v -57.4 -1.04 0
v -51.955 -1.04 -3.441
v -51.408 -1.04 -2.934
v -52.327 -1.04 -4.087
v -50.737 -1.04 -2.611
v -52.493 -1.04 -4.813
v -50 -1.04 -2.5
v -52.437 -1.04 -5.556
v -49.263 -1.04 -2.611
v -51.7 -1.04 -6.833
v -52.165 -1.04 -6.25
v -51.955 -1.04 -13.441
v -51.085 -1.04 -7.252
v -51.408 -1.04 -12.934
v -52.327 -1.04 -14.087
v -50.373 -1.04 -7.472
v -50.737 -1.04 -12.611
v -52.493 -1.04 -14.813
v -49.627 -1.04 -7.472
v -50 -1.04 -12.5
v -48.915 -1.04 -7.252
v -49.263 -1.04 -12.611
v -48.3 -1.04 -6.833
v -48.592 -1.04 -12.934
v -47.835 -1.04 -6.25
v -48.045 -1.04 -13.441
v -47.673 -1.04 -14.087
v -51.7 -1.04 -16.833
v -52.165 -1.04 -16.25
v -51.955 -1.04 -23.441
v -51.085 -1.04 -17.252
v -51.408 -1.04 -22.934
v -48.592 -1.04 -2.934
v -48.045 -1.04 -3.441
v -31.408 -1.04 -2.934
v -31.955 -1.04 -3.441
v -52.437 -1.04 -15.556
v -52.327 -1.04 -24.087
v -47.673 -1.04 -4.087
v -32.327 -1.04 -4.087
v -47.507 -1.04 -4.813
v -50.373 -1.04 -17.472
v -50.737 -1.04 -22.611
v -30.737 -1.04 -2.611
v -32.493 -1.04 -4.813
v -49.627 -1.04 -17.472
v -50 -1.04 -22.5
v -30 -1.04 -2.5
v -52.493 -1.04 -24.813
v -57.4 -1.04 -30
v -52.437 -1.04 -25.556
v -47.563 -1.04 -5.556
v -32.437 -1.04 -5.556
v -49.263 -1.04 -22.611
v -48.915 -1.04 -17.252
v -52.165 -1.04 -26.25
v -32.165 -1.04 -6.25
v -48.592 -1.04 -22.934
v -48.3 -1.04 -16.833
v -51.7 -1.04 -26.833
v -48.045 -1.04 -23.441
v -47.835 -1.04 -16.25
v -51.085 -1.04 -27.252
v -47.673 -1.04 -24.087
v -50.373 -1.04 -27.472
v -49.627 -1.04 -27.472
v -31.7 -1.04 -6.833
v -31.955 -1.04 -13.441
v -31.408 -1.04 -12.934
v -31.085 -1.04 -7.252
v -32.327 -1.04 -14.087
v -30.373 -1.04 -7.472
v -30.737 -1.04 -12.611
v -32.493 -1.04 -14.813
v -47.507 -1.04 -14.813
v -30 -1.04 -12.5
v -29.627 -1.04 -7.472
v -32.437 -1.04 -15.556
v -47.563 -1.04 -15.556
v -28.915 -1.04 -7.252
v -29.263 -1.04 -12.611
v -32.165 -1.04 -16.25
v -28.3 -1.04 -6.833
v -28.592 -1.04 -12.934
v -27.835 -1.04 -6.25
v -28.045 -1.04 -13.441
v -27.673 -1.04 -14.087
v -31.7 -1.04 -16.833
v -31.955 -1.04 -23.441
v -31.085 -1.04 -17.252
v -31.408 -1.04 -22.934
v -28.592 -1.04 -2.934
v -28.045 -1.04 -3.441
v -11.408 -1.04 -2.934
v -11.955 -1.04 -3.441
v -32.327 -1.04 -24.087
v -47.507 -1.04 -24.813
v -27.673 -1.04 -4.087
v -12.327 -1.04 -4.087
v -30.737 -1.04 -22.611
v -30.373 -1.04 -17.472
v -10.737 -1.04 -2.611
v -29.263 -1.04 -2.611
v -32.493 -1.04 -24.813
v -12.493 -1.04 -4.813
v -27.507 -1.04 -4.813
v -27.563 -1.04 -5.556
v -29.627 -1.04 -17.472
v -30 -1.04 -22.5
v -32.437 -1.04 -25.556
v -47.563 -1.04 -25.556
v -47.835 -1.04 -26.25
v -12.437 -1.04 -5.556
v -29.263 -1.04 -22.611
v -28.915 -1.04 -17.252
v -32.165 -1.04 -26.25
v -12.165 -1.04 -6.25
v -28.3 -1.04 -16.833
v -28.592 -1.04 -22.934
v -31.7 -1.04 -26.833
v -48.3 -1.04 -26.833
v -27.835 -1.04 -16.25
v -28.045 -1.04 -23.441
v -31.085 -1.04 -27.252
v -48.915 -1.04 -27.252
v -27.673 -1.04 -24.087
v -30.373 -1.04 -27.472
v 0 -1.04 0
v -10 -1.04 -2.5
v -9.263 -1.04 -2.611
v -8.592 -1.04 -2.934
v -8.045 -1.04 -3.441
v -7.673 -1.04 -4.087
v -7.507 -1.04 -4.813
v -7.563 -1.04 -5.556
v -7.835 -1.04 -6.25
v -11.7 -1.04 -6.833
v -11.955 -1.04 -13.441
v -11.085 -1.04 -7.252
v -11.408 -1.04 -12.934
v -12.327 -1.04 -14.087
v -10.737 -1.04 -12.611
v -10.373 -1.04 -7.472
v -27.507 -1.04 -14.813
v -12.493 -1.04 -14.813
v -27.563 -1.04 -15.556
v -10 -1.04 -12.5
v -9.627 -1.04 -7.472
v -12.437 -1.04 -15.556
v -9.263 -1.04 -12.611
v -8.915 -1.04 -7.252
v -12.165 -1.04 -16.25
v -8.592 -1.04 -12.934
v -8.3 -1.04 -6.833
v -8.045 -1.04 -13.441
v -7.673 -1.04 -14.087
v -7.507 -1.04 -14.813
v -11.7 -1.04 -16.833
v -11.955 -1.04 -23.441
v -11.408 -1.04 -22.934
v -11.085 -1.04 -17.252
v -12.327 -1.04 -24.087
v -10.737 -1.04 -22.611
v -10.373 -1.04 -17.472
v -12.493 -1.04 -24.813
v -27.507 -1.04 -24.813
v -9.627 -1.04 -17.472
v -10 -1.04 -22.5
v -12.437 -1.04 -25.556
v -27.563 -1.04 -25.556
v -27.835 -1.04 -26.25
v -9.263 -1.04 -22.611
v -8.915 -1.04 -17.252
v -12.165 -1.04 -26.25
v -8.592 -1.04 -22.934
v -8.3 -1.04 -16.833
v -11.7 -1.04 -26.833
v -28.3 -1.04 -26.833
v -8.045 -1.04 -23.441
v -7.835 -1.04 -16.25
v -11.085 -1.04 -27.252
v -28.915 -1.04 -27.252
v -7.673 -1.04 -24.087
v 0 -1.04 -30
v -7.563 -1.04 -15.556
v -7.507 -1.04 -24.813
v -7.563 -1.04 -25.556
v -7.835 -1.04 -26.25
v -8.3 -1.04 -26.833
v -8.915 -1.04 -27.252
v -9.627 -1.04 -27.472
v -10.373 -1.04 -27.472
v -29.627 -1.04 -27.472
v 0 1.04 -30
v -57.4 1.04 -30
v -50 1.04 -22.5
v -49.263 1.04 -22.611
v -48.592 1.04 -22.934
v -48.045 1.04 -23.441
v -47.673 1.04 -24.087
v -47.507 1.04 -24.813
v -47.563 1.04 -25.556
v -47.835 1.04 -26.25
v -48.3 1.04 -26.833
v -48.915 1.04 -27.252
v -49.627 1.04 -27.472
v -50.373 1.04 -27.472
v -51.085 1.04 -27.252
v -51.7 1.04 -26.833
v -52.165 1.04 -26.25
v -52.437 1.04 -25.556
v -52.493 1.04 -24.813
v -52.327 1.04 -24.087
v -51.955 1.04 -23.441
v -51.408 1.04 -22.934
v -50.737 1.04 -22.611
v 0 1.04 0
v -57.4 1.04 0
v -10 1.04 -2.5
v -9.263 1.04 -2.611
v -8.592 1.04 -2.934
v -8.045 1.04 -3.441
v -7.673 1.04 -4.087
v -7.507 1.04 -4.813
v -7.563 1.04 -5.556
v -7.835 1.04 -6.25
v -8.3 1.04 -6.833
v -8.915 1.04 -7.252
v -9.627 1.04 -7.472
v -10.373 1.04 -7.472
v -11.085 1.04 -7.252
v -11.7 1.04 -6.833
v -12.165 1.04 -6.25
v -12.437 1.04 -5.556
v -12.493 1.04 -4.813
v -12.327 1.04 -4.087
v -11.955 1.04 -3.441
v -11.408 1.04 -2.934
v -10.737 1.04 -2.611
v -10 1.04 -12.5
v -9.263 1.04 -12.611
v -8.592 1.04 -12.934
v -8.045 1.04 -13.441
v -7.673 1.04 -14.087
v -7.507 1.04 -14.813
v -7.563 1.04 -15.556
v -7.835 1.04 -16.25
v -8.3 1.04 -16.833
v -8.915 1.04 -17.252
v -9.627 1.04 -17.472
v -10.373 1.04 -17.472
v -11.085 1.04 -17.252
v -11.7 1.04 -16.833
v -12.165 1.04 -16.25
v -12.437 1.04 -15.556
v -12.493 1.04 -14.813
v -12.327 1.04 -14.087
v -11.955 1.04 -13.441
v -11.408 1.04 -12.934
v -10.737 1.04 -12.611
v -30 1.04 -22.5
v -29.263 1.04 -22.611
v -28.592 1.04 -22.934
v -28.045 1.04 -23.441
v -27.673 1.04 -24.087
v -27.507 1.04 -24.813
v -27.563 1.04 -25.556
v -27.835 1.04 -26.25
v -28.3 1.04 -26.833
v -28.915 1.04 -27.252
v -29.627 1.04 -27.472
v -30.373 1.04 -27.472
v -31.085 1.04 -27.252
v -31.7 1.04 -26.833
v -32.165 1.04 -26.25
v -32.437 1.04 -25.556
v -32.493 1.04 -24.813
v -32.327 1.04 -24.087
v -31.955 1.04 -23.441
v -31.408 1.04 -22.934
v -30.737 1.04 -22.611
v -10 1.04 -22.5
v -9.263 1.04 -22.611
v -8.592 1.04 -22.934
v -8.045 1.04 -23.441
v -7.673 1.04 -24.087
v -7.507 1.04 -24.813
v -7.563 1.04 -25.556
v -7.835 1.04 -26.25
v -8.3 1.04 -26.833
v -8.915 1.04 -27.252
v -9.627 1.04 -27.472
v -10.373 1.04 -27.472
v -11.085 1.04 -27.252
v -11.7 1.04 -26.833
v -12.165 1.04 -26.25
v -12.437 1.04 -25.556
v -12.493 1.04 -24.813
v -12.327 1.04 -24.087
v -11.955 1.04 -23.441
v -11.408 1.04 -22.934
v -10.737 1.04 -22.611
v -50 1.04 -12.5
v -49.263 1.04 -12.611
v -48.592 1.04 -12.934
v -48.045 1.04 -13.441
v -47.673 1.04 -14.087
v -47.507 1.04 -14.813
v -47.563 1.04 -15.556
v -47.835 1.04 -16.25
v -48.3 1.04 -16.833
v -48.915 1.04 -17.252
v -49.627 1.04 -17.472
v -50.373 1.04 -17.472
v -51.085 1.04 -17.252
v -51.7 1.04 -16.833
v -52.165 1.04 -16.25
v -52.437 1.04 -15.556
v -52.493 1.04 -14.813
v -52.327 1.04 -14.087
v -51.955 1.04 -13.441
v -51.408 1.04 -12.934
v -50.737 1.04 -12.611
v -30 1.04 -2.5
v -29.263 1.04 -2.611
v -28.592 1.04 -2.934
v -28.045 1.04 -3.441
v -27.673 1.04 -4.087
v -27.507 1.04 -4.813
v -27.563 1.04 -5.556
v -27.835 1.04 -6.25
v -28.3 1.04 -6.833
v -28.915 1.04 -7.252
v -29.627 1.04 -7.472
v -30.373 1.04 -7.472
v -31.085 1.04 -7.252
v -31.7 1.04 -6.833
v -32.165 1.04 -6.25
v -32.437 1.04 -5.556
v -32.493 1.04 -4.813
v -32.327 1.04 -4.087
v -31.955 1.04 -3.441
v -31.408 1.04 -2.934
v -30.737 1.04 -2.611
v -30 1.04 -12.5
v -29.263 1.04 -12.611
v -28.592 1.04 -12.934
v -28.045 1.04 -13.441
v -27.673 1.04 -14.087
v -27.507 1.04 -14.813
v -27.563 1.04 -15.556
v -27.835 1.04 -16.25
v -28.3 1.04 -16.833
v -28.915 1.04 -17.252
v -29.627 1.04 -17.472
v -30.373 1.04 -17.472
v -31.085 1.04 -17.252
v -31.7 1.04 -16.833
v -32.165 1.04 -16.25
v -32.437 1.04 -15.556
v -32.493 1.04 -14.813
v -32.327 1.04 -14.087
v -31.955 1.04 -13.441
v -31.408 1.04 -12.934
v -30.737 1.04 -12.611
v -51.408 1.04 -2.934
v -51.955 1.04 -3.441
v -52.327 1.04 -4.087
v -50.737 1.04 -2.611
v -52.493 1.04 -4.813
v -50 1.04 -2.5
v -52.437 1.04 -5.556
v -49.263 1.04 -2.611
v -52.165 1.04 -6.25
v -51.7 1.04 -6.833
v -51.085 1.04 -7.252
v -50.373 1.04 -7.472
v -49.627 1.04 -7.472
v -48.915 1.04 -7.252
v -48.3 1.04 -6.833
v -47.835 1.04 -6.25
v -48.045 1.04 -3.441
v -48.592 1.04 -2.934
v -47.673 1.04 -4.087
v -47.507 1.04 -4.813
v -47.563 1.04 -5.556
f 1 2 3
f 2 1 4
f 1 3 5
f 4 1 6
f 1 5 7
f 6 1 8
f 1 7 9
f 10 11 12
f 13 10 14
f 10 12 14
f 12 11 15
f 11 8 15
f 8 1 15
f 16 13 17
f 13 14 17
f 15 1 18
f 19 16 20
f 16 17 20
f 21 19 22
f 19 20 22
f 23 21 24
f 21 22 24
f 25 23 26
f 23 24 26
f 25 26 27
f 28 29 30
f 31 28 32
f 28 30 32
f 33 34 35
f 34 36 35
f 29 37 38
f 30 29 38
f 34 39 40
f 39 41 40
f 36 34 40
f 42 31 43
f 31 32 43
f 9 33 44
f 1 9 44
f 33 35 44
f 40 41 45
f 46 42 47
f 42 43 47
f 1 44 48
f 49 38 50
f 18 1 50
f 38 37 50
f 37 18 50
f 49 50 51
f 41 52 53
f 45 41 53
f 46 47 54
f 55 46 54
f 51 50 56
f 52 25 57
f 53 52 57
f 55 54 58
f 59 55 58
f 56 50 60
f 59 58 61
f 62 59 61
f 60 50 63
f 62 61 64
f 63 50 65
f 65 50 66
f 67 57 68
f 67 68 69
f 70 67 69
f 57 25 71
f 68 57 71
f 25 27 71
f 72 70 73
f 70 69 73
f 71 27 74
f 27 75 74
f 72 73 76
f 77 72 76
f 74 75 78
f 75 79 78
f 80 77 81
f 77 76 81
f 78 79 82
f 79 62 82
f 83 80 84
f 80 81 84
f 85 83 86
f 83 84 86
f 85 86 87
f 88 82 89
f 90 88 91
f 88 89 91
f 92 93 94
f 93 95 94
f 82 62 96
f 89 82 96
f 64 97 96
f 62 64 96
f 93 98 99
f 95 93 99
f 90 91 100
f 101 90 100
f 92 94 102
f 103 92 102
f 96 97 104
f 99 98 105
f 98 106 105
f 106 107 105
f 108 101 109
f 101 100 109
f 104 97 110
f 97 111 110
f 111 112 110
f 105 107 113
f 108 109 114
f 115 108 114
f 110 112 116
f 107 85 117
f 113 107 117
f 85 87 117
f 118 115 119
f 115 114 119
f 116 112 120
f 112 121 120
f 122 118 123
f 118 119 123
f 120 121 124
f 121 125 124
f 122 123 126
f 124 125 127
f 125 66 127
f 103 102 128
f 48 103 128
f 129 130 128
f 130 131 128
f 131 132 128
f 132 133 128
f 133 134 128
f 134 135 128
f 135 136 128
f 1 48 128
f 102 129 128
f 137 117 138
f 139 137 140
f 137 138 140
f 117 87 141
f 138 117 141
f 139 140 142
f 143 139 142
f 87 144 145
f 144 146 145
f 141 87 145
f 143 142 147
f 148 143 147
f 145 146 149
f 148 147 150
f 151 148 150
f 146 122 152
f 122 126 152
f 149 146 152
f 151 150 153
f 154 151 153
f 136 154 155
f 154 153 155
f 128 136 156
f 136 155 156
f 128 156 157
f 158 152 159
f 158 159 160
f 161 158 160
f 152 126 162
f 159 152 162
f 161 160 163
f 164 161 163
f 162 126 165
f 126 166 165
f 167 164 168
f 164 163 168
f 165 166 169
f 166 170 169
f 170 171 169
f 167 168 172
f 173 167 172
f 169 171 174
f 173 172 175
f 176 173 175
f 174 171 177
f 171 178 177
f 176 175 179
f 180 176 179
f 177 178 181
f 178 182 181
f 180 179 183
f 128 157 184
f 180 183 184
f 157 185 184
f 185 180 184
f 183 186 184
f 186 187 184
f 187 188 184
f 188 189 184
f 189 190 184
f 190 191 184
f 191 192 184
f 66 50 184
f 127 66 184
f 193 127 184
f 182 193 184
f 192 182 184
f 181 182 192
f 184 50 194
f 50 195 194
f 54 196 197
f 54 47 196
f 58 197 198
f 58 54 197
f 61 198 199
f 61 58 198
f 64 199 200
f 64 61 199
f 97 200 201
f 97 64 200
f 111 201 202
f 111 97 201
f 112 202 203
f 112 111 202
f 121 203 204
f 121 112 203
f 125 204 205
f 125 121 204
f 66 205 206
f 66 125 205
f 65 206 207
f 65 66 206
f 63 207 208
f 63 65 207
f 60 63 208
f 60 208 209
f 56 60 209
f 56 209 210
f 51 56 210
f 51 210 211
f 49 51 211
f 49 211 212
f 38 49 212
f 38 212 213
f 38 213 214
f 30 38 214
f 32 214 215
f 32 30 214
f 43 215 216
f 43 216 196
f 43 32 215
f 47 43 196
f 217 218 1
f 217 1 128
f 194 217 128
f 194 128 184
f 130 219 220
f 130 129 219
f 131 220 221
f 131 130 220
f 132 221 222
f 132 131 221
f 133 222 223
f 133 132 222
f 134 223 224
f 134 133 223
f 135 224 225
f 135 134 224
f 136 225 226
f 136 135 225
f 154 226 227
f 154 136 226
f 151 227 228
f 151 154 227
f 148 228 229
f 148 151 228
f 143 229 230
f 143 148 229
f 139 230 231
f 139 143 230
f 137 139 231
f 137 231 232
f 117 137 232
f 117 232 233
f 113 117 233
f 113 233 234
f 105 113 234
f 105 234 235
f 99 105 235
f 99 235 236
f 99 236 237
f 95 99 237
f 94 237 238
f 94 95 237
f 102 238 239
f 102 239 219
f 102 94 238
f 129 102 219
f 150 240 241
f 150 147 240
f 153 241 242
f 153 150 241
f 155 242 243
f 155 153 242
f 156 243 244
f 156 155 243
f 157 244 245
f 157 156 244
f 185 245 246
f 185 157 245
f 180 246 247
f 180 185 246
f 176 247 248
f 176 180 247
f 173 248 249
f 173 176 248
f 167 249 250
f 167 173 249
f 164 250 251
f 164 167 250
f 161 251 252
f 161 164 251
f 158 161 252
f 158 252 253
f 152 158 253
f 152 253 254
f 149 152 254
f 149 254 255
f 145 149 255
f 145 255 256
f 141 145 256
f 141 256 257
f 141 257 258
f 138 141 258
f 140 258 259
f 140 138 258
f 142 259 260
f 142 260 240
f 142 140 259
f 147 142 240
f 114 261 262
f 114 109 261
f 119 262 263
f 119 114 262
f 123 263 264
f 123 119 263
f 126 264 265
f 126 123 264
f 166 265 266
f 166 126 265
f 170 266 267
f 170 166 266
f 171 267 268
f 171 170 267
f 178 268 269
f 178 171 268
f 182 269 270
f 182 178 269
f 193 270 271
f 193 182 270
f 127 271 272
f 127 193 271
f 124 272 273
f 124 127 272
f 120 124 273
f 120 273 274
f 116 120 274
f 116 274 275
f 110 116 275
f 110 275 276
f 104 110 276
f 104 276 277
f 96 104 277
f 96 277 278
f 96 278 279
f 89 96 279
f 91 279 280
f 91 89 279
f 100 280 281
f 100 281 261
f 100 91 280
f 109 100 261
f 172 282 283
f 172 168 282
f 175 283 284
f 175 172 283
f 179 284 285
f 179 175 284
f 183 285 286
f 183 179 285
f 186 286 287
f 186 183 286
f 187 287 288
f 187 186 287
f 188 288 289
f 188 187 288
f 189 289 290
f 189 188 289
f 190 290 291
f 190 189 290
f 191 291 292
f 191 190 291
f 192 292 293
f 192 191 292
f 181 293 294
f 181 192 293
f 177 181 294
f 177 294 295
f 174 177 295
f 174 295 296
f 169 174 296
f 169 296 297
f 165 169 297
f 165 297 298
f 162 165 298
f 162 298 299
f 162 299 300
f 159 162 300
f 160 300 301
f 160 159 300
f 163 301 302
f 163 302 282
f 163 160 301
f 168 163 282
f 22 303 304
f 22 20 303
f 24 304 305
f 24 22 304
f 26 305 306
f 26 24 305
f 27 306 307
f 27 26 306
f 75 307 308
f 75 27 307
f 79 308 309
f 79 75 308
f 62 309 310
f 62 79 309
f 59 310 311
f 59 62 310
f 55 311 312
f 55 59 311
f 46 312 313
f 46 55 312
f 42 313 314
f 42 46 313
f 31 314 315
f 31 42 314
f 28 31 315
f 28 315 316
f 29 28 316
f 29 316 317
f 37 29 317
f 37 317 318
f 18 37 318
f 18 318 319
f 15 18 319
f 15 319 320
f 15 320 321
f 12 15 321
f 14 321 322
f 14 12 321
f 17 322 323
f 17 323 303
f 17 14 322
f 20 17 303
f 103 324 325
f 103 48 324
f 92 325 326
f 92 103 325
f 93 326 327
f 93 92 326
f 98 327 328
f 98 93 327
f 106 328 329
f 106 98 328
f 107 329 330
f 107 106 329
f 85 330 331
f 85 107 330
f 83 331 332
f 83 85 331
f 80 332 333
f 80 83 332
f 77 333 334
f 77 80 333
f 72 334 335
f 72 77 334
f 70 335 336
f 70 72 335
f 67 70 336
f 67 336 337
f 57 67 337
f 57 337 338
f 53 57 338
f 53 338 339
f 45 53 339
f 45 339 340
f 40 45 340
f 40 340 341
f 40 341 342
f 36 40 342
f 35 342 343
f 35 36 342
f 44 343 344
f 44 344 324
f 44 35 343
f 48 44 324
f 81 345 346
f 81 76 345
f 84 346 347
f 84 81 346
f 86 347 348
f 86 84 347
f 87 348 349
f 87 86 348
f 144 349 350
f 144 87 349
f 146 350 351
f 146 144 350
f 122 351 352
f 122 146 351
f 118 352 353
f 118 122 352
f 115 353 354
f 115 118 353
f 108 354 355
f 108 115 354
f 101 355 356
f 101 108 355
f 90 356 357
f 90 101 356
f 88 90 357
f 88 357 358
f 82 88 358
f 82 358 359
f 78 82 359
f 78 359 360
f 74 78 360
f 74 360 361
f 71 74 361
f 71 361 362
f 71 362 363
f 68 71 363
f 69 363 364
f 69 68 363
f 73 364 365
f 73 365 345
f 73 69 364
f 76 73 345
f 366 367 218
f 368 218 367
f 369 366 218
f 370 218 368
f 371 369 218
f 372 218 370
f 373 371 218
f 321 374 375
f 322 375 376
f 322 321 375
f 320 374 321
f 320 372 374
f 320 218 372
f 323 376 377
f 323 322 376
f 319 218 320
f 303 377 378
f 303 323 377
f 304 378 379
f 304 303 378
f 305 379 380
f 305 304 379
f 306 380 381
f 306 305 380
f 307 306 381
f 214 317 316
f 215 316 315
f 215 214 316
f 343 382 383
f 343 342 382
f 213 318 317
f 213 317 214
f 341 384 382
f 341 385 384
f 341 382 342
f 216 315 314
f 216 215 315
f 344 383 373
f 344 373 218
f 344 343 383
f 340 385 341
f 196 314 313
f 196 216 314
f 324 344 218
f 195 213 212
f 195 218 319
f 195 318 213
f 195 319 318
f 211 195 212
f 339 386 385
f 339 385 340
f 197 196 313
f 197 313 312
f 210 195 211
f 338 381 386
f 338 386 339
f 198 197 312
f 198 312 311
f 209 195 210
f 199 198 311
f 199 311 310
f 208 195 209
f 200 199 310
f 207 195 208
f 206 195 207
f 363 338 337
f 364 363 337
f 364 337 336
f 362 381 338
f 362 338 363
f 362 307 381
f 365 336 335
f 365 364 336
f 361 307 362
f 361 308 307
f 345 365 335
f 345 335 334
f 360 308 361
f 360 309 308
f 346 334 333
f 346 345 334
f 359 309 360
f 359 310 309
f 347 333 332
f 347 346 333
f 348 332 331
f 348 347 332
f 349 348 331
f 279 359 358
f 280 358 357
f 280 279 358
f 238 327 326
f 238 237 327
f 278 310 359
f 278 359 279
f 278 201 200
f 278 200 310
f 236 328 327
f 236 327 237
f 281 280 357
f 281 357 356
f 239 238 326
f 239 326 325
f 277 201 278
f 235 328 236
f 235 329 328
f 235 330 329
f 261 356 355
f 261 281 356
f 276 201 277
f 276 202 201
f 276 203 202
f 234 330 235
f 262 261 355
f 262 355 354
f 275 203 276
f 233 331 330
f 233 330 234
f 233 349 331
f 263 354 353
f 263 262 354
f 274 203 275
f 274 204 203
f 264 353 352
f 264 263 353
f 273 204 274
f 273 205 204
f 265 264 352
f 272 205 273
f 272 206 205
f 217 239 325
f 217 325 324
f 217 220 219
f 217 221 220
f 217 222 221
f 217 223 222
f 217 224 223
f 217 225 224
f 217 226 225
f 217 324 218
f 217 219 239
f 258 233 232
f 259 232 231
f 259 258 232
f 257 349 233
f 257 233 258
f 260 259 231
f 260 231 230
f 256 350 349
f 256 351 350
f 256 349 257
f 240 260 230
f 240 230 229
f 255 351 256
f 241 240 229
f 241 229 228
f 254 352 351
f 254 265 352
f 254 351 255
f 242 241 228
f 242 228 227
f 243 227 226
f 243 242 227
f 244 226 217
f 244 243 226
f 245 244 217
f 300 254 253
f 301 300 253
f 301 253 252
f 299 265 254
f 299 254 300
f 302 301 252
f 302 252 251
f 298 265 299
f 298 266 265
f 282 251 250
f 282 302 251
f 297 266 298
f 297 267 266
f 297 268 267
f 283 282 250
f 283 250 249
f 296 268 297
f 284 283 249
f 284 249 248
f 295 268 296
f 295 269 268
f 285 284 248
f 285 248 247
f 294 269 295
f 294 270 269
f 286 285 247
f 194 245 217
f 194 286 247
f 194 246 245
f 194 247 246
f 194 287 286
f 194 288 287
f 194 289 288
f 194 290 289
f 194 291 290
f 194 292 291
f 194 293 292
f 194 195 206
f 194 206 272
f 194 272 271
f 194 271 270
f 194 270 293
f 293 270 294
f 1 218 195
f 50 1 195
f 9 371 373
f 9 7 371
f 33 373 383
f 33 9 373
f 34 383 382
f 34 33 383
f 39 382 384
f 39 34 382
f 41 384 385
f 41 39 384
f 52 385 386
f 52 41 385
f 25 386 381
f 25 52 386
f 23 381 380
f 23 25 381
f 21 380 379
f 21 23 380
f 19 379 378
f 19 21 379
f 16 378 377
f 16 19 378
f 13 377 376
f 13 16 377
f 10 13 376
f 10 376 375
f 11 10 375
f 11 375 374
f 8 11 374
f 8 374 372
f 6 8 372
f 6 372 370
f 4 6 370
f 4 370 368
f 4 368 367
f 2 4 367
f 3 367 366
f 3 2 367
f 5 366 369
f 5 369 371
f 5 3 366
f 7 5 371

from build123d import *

# Parameters (mm, degrees)
SKETCH2_W           = 57.4
SKETCH2_H           = 30
SKETCH2_R           = 2.5
BOSS_EXTRUDE1_DEPTH = 1.04


with BuildPart() as part:
    # Sketch2 → Boss-Extrude1 (new, symmetric)
    with BuildSketch(Plane(origin=(0, 0, 0), x_dir=(1, 0, 0), z_dir=(0, 1, 0))):
        with Locations((-28.7, 15)):
            Rectangle(SKETCH2_W, SKETCH2_H)
        with Locations(Location((-50, 25, 0), (0, 0, 270))):
            Circle(SKETCH2_R, mode=Mode.SUBTRACT)
        with Locations(Location((-50, 15, 0), (0, 0, 270))):
            Circle(SKETCH2_R, mode=Mode.SUBTRACT)
        with Locations(Location((-50, 5, 0), (0, 0, 270))):
            Circle(SKETCH2_R, mode=Mode.SUBTRACT)
        with Locations(Location((-30, 5, 0), (0, 0, 270))):
            Circle(SKETCH2_R, mode=Mode.SUBTRACT)
        with Locations(Location((-30, 15, 0), (0, 0, 270))):
            Circle(SKETCH2_R, mode=Mode.SUBTRACT)
        with Locations(Location((-30, 25, 0), (0, 0, 270))):
            Circle(SKETCH2_R, mode=Mode.SUBTRACT)
        with Locations(Location((-10, 5, 0), (0, 0, 270))):
            Circle(SKETCH2_R, mode=Mode.SUBTRACT)
        with Locations(Location((-10, 15, 0), (0, 0, 270))):
            Circle(SKETCH2_R, mode=Mode.SUBTRACT)
        with Locations(Location((-10, 25, 0), (0, 0, 270))):
            Circle(SKETCH2_R, mode=Mode.SUBTRACT)
    extrude(amount=BOSS_EXTRUDE1_DEPTH, both=True)


solid = part.part
